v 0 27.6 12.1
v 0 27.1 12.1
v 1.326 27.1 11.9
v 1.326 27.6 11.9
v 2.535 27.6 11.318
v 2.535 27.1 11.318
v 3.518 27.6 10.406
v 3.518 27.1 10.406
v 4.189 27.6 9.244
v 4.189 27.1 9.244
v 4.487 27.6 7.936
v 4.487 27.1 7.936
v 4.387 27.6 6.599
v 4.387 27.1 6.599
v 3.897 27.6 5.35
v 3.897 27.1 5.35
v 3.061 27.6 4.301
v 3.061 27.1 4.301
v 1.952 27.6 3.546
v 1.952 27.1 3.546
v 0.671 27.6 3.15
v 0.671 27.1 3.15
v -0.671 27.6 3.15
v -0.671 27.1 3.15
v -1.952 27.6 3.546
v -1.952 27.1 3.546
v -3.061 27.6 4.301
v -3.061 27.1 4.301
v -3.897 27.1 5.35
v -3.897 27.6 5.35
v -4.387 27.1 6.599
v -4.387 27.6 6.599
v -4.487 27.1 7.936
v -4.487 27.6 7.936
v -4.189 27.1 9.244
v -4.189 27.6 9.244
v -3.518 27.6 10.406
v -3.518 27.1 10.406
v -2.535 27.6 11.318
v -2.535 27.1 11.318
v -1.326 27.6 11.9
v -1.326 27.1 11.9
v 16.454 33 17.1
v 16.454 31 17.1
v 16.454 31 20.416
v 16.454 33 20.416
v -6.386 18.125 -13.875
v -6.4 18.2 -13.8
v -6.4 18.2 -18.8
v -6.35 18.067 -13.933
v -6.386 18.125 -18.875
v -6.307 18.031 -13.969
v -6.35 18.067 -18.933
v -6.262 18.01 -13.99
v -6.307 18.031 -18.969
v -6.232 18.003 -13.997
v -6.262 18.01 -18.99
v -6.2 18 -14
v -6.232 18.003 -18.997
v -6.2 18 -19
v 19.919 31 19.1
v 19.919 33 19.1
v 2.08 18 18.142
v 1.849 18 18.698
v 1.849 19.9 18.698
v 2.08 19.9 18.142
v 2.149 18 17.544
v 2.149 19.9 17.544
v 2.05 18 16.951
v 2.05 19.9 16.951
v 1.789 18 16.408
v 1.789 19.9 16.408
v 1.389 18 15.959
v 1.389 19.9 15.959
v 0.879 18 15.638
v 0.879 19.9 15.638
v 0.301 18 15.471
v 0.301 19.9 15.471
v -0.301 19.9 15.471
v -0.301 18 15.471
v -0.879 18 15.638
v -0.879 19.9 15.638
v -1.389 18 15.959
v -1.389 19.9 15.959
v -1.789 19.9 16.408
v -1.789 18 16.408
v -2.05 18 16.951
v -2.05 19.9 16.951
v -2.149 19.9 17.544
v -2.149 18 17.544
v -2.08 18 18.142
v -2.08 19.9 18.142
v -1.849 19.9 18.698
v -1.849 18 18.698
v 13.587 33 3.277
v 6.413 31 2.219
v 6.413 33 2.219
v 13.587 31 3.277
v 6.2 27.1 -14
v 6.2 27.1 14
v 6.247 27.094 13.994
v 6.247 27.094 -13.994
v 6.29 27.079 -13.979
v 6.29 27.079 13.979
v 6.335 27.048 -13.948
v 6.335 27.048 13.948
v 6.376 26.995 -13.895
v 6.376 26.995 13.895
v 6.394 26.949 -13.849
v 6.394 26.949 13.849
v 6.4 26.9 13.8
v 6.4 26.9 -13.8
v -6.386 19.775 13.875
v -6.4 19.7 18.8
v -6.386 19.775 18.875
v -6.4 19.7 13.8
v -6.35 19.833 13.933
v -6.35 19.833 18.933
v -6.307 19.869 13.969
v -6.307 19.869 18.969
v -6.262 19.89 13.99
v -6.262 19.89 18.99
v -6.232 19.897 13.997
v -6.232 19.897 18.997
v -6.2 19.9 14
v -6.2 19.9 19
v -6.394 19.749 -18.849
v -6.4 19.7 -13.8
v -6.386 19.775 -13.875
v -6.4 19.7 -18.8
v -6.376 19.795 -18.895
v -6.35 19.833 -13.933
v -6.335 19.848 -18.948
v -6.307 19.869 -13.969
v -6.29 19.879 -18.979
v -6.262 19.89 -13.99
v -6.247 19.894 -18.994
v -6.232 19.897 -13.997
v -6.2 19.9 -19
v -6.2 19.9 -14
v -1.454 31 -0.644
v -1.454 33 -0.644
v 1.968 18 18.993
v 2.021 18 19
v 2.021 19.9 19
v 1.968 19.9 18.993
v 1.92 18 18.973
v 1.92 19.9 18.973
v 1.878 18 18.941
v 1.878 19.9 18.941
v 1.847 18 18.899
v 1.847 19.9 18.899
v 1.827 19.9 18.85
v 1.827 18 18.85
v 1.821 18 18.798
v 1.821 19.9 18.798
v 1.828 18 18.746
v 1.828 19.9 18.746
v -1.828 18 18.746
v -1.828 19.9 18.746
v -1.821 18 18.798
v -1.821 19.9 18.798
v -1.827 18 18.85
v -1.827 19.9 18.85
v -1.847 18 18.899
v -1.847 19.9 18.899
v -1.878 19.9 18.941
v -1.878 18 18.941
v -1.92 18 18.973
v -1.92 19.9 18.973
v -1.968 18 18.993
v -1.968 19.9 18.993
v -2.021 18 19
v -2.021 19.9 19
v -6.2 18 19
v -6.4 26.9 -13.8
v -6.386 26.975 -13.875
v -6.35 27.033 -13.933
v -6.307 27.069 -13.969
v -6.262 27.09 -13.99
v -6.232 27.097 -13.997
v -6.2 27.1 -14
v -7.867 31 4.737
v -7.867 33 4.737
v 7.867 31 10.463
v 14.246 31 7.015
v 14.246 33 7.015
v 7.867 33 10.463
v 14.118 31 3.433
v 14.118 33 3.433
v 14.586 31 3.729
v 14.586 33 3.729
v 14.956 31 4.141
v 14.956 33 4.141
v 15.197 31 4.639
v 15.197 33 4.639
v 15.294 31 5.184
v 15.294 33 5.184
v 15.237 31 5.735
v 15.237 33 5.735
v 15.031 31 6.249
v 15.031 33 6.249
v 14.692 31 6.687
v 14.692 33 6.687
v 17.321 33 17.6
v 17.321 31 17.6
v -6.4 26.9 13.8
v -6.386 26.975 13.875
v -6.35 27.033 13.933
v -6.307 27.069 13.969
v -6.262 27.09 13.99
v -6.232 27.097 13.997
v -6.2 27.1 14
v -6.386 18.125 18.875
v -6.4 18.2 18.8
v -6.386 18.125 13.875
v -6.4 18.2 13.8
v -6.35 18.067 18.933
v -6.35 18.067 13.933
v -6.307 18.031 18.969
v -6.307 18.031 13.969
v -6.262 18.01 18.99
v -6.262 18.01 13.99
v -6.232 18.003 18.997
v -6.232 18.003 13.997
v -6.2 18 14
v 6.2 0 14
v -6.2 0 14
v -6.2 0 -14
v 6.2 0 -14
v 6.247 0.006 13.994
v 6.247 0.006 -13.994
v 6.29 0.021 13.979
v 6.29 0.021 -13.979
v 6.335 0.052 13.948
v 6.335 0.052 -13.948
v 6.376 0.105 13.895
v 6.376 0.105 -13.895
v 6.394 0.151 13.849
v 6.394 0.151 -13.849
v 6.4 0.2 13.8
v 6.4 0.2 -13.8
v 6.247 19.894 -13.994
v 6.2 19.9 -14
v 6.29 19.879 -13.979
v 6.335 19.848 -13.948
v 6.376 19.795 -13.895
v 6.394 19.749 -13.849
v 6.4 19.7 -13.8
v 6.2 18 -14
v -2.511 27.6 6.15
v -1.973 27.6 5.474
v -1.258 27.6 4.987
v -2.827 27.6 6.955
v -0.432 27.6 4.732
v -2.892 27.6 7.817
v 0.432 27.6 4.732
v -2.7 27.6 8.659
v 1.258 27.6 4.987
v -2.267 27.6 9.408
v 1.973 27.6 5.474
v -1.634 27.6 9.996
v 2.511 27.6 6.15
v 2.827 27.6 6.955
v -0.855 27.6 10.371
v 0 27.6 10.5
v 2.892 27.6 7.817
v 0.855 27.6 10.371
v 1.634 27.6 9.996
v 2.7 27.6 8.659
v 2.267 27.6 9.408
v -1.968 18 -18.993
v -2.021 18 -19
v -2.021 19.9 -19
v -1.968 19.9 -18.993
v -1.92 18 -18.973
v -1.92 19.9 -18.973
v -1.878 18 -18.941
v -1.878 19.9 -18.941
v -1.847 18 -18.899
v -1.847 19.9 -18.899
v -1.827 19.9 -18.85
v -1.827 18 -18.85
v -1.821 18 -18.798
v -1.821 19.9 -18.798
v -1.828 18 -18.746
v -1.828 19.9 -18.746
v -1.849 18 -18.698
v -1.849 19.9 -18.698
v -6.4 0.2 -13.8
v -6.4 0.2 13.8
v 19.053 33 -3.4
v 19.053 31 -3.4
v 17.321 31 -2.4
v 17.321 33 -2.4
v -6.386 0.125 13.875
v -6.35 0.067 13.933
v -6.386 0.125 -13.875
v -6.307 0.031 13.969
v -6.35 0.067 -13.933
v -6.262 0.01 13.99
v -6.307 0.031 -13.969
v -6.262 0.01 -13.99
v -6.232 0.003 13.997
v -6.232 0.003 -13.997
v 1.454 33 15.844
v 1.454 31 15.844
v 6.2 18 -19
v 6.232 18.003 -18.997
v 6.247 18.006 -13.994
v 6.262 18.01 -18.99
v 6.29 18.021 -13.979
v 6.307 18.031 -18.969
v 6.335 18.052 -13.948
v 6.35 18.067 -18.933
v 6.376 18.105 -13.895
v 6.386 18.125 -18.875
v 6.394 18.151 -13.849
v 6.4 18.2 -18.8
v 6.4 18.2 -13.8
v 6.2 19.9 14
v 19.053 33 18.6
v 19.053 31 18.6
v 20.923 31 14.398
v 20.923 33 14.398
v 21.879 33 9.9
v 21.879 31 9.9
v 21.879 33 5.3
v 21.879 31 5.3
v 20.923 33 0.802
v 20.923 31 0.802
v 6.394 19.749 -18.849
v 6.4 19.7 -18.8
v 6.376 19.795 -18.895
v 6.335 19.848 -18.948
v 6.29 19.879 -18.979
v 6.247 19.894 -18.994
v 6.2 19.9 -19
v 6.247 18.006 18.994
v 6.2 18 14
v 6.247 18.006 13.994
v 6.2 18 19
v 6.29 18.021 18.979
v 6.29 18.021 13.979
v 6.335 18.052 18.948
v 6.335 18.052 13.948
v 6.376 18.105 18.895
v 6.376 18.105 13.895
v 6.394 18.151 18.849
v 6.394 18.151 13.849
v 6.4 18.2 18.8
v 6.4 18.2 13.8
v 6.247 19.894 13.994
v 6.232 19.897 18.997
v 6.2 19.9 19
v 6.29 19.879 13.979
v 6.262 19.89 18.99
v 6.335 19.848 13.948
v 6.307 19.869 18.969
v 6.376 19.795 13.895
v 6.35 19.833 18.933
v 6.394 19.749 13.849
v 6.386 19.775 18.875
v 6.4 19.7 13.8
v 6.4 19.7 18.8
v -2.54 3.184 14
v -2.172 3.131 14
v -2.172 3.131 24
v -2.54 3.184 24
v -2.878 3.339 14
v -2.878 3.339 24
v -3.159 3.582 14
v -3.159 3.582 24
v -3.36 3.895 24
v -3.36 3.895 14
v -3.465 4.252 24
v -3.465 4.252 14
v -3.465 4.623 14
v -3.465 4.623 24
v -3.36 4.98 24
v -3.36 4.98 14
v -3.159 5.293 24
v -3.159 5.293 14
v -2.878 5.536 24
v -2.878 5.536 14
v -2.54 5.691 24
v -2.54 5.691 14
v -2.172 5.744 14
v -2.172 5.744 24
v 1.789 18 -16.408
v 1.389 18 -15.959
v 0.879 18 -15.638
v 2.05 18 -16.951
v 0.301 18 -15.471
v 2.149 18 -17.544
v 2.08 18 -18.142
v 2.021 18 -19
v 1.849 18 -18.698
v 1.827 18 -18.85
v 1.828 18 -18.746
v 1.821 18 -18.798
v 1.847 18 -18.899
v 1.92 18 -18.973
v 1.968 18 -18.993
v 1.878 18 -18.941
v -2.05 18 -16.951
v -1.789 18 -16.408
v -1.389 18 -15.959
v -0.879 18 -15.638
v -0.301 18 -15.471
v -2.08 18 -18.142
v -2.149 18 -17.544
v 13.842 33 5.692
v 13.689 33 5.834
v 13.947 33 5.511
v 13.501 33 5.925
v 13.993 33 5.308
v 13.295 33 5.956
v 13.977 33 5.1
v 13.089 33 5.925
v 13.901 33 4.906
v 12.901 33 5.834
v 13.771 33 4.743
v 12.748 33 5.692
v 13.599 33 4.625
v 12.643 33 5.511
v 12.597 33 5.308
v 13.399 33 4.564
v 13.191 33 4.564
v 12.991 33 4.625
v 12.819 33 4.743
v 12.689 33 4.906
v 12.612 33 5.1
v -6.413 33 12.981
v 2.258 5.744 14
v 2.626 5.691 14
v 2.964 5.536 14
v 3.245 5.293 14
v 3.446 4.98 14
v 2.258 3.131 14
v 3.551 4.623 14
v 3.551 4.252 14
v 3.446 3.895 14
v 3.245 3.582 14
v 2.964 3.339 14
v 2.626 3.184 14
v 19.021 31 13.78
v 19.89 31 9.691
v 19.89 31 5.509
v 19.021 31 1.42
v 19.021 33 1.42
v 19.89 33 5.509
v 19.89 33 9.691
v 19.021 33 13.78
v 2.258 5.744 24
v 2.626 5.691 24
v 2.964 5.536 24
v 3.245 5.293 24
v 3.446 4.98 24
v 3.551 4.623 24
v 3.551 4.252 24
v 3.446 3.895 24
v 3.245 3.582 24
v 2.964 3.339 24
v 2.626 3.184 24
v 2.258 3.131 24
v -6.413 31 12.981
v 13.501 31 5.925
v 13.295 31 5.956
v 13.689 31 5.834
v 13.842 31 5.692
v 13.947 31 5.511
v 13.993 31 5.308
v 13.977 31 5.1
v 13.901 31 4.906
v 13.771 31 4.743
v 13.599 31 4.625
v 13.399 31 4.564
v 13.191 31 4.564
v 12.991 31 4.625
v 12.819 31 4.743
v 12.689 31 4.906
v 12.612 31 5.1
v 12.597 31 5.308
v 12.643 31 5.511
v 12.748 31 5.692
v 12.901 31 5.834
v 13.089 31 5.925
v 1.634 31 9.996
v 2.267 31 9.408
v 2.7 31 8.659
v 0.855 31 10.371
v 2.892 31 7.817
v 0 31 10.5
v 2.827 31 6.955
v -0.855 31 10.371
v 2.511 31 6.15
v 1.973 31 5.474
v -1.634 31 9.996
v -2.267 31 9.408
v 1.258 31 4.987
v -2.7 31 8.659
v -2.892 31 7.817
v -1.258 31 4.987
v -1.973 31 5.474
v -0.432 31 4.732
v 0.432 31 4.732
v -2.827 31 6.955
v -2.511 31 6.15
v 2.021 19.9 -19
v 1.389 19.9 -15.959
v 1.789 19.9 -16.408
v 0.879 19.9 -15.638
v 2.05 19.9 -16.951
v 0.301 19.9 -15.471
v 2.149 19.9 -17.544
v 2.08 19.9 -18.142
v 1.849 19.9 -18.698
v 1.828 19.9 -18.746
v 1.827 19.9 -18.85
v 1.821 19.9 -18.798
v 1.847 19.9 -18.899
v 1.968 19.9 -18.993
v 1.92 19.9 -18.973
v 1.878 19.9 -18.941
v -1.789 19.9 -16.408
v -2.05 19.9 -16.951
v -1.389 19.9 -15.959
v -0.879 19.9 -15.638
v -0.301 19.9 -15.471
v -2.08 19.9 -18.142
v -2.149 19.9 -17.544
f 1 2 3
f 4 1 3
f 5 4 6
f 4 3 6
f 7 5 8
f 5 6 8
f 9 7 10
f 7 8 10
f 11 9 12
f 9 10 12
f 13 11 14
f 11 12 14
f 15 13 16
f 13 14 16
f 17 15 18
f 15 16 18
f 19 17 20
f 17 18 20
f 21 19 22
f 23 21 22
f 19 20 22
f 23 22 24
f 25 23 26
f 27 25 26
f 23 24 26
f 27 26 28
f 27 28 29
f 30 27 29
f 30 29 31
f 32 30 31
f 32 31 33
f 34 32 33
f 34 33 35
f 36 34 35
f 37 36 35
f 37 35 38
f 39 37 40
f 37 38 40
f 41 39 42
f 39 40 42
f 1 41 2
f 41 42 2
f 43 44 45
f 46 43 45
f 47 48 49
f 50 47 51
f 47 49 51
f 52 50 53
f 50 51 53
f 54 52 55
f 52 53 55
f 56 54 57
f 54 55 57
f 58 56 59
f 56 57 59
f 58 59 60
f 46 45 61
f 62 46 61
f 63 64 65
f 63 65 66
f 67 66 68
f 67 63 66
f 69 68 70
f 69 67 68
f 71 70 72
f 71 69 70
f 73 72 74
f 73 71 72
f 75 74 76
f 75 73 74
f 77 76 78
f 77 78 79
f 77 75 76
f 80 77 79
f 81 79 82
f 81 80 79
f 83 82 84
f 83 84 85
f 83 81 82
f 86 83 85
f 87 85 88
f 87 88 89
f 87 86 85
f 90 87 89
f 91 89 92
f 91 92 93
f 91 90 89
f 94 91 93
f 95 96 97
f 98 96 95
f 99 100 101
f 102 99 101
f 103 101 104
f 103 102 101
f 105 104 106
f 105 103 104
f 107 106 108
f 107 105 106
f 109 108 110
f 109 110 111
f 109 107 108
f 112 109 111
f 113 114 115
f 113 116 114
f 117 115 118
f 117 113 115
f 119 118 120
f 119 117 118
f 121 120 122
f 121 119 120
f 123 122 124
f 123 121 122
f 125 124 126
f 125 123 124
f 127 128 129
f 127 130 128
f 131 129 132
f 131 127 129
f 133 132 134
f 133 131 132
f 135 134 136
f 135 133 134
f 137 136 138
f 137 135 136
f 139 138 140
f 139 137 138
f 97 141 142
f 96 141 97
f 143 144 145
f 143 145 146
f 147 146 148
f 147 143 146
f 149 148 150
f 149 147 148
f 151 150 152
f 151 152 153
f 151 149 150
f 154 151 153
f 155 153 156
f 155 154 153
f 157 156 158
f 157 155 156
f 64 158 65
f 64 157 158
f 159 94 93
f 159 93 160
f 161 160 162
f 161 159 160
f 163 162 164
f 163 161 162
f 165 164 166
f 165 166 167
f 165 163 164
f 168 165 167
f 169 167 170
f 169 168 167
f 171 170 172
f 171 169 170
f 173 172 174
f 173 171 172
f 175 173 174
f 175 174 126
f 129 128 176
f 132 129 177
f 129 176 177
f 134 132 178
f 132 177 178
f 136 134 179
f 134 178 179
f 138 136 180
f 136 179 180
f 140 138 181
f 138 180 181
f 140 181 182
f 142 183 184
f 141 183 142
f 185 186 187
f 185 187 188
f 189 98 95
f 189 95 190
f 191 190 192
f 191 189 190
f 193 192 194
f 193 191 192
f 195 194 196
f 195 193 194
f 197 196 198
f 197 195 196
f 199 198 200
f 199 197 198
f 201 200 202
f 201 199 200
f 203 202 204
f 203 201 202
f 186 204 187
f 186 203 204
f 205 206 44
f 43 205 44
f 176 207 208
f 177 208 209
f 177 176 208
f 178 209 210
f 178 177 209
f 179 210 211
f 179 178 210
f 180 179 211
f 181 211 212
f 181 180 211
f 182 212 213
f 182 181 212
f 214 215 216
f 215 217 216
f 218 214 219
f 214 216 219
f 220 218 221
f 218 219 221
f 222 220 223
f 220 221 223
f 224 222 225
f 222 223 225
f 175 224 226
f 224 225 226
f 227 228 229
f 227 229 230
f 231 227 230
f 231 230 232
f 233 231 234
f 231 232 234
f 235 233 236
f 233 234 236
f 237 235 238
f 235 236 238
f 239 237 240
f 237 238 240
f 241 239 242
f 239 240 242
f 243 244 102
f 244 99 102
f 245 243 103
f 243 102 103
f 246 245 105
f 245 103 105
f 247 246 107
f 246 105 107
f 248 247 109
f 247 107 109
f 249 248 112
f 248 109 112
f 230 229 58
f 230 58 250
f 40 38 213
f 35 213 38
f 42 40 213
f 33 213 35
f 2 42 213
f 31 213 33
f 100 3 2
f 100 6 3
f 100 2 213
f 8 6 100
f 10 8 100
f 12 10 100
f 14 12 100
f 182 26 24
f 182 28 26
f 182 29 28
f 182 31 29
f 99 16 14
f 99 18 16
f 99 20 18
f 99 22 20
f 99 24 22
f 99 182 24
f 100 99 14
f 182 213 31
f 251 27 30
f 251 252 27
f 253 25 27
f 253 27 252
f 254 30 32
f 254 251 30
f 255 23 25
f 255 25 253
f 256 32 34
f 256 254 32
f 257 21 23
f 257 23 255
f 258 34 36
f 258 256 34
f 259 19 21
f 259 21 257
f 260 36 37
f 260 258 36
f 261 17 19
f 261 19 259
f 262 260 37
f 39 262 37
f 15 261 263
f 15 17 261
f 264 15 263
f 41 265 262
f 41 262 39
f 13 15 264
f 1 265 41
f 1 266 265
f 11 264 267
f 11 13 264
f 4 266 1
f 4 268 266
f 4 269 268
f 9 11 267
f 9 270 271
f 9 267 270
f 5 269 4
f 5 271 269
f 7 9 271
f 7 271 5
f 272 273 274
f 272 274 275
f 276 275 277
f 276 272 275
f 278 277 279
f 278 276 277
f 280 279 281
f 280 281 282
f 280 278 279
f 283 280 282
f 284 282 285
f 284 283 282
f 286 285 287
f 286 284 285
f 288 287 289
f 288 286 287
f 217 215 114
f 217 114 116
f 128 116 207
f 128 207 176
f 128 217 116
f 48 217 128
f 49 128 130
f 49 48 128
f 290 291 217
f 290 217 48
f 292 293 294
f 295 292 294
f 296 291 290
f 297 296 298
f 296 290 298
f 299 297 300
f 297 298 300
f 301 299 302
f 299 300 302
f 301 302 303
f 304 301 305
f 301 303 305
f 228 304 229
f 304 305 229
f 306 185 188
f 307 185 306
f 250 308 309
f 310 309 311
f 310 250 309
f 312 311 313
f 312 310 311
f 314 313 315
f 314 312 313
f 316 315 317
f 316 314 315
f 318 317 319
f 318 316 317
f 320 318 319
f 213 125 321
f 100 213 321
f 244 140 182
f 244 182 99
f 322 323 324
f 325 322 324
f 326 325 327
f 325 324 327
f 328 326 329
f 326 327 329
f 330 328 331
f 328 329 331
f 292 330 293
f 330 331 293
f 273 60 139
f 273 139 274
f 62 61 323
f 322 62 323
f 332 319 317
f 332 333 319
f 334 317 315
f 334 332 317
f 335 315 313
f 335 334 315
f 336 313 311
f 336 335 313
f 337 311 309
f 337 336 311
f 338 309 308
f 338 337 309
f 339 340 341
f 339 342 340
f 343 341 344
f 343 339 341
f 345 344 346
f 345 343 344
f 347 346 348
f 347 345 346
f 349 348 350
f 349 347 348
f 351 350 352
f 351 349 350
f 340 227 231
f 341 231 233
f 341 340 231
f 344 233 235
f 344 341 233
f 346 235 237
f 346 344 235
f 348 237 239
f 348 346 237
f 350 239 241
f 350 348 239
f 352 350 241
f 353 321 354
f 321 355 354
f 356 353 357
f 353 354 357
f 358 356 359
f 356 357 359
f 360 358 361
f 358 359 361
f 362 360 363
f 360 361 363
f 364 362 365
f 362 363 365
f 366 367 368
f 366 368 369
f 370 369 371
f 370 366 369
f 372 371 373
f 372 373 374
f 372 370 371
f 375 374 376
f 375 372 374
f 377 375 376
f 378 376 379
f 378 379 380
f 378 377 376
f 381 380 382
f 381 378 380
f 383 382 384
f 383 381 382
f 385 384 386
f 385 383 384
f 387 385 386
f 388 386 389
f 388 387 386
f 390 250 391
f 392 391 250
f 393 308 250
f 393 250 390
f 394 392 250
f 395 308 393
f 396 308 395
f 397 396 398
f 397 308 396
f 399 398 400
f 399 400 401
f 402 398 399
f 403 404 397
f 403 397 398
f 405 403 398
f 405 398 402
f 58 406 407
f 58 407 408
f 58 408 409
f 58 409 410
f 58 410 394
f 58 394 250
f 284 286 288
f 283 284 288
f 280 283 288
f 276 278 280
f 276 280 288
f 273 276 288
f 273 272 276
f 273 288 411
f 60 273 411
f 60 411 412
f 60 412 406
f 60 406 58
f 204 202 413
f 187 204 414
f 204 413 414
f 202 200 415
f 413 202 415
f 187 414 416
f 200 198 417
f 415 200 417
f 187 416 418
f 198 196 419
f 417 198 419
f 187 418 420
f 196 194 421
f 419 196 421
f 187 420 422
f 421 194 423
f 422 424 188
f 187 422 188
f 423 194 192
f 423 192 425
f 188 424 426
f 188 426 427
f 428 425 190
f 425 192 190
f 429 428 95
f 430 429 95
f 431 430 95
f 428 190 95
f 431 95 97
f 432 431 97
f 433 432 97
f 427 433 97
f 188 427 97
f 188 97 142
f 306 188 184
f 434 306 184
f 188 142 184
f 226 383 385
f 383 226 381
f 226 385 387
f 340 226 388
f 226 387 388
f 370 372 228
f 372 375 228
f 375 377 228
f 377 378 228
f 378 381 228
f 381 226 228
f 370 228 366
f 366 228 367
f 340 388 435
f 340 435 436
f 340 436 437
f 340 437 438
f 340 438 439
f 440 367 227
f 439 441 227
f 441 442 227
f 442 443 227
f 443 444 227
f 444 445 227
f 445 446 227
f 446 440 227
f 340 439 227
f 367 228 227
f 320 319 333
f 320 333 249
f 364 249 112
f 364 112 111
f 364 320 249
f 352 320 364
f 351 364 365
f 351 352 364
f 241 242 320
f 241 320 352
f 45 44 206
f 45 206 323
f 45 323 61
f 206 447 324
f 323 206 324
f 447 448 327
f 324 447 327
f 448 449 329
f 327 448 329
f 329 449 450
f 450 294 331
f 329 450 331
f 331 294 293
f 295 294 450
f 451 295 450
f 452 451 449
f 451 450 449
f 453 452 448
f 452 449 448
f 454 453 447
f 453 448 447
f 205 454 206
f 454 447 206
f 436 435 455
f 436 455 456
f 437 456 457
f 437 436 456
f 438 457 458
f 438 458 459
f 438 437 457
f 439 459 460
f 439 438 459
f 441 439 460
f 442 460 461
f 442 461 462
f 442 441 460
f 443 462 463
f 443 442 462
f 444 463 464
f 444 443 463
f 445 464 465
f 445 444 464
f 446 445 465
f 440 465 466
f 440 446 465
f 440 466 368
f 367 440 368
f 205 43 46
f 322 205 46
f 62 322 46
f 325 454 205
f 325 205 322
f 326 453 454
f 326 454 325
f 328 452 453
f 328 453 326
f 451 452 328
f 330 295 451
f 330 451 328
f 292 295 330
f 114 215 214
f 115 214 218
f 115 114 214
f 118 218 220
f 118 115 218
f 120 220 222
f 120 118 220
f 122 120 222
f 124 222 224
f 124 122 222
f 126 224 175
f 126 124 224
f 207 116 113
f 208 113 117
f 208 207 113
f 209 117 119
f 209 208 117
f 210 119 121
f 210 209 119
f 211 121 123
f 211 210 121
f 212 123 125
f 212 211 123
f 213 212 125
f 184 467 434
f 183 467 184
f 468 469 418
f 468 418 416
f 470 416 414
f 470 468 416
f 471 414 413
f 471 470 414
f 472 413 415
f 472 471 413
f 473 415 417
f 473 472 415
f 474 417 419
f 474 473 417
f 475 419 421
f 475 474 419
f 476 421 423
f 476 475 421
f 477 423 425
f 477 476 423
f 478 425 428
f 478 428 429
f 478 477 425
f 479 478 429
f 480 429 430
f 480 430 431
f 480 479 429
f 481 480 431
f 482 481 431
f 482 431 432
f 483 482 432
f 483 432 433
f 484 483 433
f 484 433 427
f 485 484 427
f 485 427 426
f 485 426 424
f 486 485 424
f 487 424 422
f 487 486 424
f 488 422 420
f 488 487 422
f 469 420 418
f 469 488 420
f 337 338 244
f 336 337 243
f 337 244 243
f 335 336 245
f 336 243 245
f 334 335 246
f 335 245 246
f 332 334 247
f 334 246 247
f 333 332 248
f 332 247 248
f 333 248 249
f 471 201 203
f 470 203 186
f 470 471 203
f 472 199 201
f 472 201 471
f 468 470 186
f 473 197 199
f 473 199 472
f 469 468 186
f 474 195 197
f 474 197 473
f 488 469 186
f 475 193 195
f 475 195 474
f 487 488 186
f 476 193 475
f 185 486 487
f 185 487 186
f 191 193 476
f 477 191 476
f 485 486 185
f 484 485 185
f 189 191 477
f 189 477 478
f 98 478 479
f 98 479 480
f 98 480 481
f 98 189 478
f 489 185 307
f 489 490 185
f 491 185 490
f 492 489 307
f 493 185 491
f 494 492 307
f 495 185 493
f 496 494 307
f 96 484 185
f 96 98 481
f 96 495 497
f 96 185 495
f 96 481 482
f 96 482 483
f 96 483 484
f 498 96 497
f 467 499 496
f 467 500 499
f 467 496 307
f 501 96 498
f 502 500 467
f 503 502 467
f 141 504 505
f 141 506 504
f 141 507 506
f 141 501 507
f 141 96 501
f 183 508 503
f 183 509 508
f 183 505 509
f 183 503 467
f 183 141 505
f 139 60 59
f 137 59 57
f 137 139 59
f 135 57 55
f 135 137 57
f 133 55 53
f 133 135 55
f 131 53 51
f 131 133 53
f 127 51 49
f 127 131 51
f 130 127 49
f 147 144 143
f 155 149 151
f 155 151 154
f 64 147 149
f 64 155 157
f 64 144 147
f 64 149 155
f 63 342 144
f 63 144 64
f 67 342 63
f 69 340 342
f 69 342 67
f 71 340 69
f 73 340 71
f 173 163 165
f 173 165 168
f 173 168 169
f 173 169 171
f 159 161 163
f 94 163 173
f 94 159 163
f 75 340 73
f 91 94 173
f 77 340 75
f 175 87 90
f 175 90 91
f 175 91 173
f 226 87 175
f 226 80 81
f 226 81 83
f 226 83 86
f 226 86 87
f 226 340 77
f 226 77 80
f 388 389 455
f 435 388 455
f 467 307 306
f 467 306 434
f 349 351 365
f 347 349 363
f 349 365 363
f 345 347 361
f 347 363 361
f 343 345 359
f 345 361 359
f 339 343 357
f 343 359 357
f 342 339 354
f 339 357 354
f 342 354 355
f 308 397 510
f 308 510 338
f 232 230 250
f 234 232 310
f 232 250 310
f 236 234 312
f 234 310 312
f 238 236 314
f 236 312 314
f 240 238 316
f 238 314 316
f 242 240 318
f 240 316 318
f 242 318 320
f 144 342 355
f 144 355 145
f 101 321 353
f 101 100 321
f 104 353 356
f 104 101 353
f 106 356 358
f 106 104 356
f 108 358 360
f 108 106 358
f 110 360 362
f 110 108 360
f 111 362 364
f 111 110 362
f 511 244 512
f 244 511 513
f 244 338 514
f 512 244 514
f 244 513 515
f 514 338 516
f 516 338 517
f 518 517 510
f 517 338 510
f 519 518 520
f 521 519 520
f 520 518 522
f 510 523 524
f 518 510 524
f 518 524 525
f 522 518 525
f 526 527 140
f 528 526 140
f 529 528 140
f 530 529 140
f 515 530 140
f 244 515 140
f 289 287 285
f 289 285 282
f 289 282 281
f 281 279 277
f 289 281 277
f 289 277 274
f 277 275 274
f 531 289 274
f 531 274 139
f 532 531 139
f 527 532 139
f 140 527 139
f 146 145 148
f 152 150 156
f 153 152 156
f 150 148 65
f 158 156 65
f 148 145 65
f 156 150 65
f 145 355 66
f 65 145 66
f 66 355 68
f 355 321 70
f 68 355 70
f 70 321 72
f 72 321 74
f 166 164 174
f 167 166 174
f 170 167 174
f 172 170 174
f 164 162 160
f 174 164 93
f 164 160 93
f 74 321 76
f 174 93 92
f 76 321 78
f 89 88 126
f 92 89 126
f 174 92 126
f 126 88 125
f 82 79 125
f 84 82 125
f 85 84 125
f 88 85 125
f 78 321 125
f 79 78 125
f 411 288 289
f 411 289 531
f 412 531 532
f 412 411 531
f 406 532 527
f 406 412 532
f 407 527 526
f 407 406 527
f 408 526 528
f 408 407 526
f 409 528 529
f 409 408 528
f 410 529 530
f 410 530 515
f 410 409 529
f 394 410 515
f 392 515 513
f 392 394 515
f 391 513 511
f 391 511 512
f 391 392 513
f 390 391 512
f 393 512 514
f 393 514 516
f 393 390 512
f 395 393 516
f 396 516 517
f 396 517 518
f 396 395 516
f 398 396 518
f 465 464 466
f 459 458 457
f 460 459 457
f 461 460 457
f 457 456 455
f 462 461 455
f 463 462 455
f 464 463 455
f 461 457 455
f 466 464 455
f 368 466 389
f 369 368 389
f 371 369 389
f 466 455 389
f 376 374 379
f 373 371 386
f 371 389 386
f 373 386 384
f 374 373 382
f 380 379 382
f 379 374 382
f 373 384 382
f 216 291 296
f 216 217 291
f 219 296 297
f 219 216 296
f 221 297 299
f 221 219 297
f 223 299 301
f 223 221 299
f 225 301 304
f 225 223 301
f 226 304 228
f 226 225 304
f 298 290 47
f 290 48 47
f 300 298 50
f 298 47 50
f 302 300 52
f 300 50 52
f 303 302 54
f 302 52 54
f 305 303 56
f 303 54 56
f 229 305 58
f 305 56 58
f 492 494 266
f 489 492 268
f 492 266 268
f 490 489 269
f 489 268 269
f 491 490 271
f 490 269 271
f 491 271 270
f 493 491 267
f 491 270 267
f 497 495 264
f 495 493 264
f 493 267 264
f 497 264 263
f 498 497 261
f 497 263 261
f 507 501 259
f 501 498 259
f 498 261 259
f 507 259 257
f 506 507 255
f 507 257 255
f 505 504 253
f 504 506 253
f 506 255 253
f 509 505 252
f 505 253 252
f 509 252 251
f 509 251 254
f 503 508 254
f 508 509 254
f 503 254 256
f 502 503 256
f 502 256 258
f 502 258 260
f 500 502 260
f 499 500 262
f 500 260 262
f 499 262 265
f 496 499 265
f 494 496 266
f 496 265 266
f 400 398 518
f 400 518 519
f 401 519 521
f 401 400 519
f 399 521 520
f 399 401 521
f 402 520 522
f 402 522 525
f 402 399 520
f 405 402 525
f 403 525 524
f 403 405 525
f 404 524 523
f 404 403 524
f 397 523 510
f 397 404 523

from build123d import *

# Parameters (mm, degrees)
SKETCH_1_W      = 12.8
SKETCH_1_H      = 28
EXTRUDE_1_DEPTH = 18
EXTRUDE_2_DEPTH = 1.9
SKETCH_3_W      = 12.8
SKETCH_3_H      = 28
EXTRUDE_3_DEPTH = 7.2
SKETCH_4_R      = 4.5
EXTRUDE_4_DEPTH = 0.5
SKETCH_5_R      = 2.9
EXTRUDE_5_DEPTH = 3.9
FILLET_1_R      = 0.2
EXTRUDE_6_DEPTH = 10
SKETCH_7_R      = 0.7
EXTRUDE_7_DEPTH = 2


with BuildPart() as part:
    # 草图1 → 凸台-拉伸1 (new body)
    with BuildSketch(Plane(origin=(0, 0, 0), x_dir=(1, 0, 0), z_dir=(0, 1, 0))):
        Rectangle(SKETCH_1_W, SKETCH_1_H)
    extrude(amount=EXTRUDE_1_DEPTH)

    # 草图2 → 凸台-拉伸2 (add)
    with BuildSketch(Plane(origin=(0, 18, 0), x_dir=(1, 0, 0), z_dir=(0, 1, 0))):
        with BuildLine():
            Line((-6.4, 19), (-2.020519735, 19))
            ThreePointArc((-2.020519735, 19), (-1.846701537, 18.898930451), (-1.848560609, 18.69787234))
            ThreePointArc((-1.848560609, 18.69787234), (0, 15.45), (1.848560609, 18.69787234))
            ThreePointArc((1.848560609, 18.69787234), (1.846701537, 18.898930451), (2.020519735, 19))
            Line((2.020519735, 19), (6.4, 19))
            Line((6.4, 19), (6.4, -19))
            Line((6.4, -19), (2.020519735, -19))
            ThreePointArc((2.020519735, -19), (1.846701537, -18.898930451), (1.848560609, -18.69787234))
            ThreePointArc((1.848560609, -18.69787234), (0, -15.45), (-1.848560609, -18.69787234))
            ThreePointArc((-1.848560609, -18.69787234), (-1.846701537, -18.898930451), (-2.020519735, -19))
            Line((-2.020519735, -19), (-6.4, -19))
            Line((-6.4, -19), (-6.4, 19))
        make_face()
    extrude(amount=EXTRUDE_2_DEPTH)

    # 草图3 → 凸台-拉伸3 (add)
    with BuildSketch(Plane(origin=(0, 19.9, 0), x_dir=(1, 0, 0), z_dir=(0, 1, 0))):
        Rectangle(SKETCH_3_W, SKETCH_3_H)
    extrude(amount=EXTRUDE_3_DEPTH)

    # 草图4 → 凸台-拉伸4 (add)
    with BuildSketch(Plane(origin=(0, 27.1, 0), x_dir=(1, 0, 0), z_dir=(0, 1, 0))):
        with Locations(Location((0, -7.6, 0), (0, 0, 270))):
            Circle(SKETCH_4_R)
    extrude(amount=EXTRUDE_4_DEPTH)

    # 草图5 → 凸台-拉伸5 (add)
    with BuildSketch(Plane(origin=(0, 27.6, 0), x_dir=(1, 0, 0), z_dir=(0, 1, 0))):
        with Locations(Location((0, -7.6, 0), (0, 0, 270))):
            Circle(SKETCH_5_R)
    extrude(amount=EXTRUDE_5_DEPTH)

    # 圆角1
    fillet_1_edges = [part.edges().sort_by_distance(p)[0] for p in [
        (6.4, 9, 14),
        (6.4, 18, 16.5),
        (6.4, 18.95, 19),
        (6.4, 19.9, 16.5),
        (6.4, 23.5, 14),
        (6.4, 27.1, 0),
        (6.4, 23.5, -14),
        (6.4, 19.9, -16.5),
        (6.4, 18.95, -19),
        (6.4, 18, -16.5),
        (6.4, 9, -14),
        (6.4, 0, 0),
        (-6.4, 9, -14),
        (-6.4, 18, -16.5),
        (-6.4, 18.95, -19),
        (-6.4, 19.9, -16.5),
        (-6.4, 23.5, -14),
        (-6.4, 27.1, 0),
        (-6.4, 23.5, 14),
        (-6.4, 19.9, 16.5),
        (-6.4, 18.95, 19),
        (-6.4, 18, 16.5),
        (-6.4, 9, 14),
        (-6.4, 0, 0),
    ]]
    fillet(fillet_1_edges, radius=FILLET_1_R)

    # 草图6 → 凸台-拉伸6 (add)
    with BuildSketch(Plane.XY.offset(14)):
        with BuildLine():
            Line((-2.17212992, 5.7438306), (2.258112685, 5.7438306))
            ThreePointArc((2.258112685, 5.7438306), (3.564466274, 4.437477011), (2.258112685, 3.131123422))
            Line((2.258112685, 3.131123422), (-2.17212992, 3.131123422))
            ThreePointArc((-2.17212992, 3.131123422), (-3.478483509, 4.437477011), (-2.17212992, 5.7438306))
        make_face()
    extrude(amount=EXTRUDE_6_DEPTH)

    # 草图7 → 凸台-拉伸7 (add)
    # profile 1 of 2: a face of its own
    with BuildSketch(Plane(origin=(0, 31, 0), x_dir=(1, 0, 0), z_dir=(0, 1, 0))):
        with BuildLine():
            Line((6.413001499, -2.218852807), (13.586794799, -3.27716421))
            ThreePointArc((13.586794799, -3.27716421), (15.264520172, -4.908453246), (14.245907729, -7.015179388))
            Line((14.245907729, -7.015179388), (7.86671092, -10.463248616))
            Line((7.86671092, -10.463248616), (1.453709421, -15.844395809))
            Line((1.453709421, -15.844395809), (-6.413001499, -12.981147193))
            Line((-6.413001499, -12.981147193), (-7.86671092, -4.736751384))
            Line((-7.86671092, -4.736751384), (-1.453709421, 0.644395809))
            Line((-1.453709421, 0.644395809), (6.413001499, -2.218852807))
        make_face()
        with Locations(Location((13.294904666, -5.255749601, 0), (0, 0, 270))):
            Circle(SKETCH_7_R, mode=Mode.SUBTRACT)
    # profile 2 of 2: a face of its own
    with BuildSketch(Plane(origin=(0, 31, 0), x_dir=(1, 0, 0), z_dir=(0, 1, 0))):
        with BuildLine():
            Line((16.454482672, -17.1), (16.454482672, -20.416255395))
            Line((16.454482672, -20.416255395), (19.918584287, -19.1))
            Line((19.918584287, -19.1), (19.052558883, -18.6))
            ThreePointArc((19.052558883, -18.6), (22, -7.6), (19.052558883, 3.4))
            Line((19.052558883, 3.4), (17.320508076, 2.4))
            ThreePointArc((17.320508076, 2.4), (20, -7.6), (17.320508076, -17.6))
            Line((17.320508076, -17.6), (16.454482672, -17.1))
        make_face()
    extrude(amount=EXTRUDE_7_DEPTH)


with BuildPart() as extrude_7_piece_1:
    # of the separate pieces the step leaves, piece 1, a body of its own (extrude_7_pieces)
    add(part.part.solids().sort_by_distance((6.2, 18, 19))[0])


with BuildPart() as extrude_7_piece_2:
    # of the separate pieces the step leaves, piece 2, a body of its own (extrude_7_pieces)
    add(part.part.solids().sort_by_distance((17.320508076, 31, 17.6))[0])


solid = Compound([extrude_7_piece_1.part, extrude_7_piece_2.part])
